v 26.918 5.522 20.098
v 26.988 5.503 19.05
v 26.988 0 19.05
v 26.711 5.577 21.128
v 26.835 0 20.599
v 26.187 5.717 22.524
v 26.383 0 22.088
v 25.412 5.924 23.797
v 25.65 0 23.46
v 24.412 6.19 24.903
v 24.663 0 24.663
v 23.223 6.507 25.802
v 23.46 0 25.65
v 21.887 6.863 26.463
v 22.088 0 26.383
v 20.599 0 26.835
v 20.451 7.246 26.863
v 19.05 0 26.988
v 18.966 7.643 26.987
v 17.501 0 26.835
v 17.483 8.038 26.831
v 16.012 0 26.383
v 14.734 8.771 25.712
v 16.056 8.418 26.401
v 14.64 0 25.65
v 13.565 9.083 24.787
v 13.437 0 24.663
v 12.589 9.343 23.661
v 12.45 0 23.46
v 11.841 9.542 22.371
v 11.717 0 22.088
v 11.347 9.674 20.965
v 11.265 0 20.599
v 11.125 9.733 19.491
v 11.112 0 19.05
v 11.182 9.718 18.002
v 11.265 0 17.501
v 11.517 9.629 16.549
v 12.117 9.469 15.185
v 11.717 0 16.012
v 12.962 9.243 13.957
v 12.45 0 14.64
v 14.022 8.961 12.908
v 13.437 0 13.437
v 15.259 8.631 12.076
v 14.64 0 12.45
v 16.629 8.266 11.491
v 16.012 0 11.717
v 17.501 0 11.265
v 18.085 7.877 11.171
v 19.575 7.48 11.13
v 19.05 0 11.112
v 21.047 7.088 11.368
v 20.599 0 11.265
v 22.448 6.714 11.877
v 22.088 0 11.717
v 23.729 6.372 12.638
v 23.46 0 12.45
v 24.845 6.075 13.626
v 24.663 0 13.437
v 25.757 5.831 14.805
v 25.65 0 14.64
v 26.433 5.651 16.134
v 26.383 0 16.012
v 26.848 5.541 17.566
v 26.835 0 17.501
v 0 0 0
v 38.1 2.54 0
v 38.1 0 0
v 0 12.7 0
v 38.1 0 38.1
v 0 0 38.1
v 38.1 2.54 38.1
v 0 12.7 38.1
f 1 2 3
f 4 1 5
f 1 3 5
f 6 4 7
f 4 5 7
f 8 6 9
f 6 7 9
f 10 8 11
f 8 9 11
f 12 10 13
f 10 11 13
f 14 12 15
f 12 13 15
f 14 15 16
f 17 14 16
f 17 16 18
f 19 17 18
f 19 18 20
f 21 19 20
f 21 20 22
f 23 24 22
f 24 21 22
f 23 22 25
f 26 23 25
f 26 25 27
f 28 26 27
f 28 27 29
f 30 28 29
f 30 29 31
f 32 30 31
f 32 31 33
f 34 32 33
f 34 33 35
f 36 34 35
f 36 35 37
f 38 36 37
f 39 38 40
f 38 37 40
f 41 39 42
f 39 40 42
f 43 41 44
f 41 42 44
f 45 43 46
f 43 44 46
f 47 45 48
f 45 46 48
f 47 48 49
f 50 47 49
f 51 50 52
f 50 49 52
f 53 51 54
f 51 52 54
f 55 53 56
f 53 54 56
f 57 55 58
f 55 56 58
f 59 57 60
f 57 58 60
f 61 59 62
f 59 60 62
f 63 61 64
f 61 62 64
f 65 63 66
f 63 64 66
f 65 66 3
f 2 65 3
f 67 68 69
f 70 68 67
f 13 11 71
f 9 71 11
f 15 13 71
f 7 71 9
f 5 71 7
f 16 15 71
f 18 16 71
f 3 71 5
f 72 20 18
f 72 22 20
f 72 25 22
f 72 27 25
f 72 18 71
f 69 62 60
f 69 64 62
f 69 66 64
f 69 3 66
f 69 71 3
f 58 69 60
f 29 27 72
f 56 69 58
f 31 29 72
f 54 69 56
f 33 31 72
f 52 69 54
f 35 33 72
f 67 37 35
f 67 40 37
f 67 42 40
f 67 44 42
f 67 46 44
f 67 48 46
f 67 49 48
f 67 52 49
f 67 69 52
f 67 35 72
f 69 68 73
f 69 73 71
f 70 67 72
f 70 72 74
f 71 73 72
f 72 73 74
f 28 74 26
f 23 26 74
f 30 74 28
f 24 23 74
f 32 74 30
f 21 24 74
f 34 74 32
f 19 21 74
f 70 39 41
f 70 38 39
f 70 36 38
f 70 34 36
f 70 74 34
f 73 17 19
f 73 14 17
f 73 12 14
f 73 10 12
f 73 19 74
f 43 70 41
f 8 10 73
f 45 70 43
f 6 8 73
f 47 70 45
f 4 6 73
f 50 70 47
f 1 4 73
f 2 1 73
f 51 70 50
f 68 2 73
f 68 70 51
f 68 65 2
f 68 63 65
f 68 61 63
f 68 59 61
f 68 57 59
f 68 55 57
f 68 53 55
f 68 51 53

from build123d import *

# Parameters (mm, degrees)
BOSS_EXTRUDE1_DEPTH = 38.1
SKETCH2_R           = 7.9375
CUT_EXTRUDE1_DEPTH  = 38.1


with BuildPart() as part:
    # Sketch1 → Boss-Extrude1 (new body)
    with BuildSketch(Plane.XY):
        Polygon((0, 0), (0, 12.7), (38.1, 2.54), (38.1, 0), align=None)
    extrude(amount=BOSS_EXTRUDE1_DEPTH)

    # Sketch2 → Cut-Extrude1 (cut)
    with BuildSketch(Plane.XZ):
        with Locations((19.05, 19.05)):
            Circle(SKETCH2_R)
    extrude(amount=-CUT_EXTRUDE1_DEPTH, mode=Mode.SUBTRACT)


solid = part.part
